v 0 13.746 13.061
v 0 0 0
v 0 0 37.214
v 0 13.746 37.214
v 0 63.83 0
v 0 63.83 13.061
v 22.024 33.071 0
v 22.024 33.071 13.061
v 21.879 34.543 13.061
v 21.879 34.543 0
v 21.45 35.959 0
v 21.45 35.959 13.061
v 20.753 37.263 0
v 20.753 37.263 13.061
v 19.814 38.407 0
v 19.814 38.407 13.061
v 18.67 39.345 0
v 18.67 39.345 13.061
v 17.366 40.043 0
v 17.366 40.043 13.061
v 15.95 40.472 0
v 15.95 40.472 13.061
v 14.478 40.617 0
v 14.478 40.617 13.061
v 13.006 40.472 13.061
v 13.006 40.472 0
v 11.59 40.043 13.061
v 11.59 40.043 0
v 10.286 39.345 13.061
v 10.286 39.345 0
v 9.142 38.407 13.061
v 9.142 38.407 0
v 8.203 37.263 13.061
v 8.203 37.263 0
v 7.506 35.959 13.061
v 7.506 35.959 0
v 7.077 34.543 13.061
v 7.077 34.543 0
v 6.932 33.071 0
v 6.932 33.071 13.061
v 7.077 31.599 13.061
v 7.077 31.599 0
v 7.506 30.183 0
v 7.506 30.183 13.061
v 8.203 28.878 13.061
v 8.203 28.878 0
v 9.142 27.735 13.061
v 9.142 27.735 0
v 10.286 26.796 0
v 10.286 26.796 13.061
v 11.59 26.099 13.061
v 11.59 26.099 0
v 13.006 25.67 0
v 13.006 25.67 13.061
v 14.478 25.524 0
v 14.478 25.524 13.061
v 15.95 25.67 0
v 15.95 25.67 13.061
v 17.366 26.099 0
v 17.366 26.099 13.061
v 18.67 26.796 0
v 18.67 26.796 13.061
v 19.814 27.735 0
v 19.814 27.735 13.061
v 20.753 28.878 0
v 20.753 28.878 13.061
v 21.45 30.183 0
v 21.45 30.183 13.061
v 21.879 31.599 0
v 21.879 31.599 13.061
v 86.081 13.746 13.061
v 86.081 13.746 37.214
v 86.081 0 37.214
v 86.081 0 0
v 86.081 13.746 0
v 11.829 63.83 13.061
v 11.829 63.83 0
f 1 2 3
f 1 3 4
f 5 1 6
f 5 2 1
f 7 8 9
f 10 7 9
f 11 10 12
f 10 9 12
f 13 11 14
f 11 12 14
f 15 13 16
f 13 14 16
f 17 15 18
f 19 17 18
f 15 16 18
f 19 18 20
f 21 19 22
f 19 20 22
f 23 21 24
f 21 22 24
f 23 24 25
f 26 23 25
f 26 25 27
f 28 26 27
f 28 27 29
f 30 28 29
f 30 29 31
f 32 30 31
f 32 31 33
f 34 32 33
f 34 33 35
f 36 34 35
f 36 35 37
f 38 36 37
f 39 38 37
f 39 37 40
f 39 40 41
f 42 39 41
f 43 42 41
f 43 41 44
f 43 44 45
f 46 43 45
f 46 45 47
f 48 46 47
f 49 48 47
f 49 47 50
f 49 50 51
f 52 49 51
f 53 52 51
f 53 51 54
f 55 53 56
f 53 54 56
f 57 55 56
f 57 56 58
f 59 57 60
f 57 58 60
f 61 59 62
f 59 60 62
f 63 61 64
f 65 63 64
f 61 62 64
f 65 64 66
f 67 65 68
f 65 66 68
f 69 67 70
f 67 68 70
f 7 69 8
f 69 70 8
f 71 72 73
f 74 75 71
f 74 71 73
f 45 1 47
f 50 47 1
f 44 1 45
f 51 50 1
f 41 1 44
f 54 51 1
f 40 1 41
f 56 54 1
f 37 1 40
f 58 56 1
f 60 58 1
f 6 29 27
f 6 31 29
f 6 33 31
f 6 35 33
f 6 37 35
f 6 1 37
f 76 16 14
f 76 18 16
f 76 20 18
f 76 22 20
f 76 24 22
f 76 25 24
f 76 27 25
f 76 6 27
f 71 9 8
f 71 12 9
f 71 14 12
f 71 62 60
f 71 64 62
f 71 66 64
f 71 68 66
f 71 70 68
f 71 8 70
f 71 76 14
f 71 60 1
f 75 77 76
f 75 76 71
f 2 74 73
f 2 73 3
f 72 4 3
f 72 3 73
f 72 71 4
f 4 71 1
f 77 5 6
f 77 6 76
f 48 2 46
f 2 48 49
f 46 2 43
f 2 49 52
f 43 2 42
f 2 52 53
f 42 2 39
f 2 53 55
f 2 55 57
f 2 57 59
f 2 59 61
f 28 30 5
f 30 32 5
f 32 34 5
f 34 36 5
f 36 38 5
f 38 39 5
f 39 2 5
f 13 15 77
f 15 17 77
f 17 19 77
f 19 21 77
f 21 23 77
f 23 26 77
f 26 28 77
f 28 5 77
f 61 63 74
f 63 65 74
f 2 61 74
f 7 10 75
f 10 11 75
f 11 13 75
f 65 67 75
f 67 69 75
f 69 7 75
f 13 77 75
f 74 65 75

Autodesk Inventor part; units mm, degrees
ref_plane "YZ Plane" through (0, 0, 0) normal (1, 0, 0) x (0, 1, 0)
ref_plane "XZ Plane" through (0, 0, 0) normal (0, 1, 0) x (-1, 0, 0)
ref_plane "XY Plane" through (0, 0, 0) normal (0, 0, 1) x (1, 0, 0)
sketch "Sketch1" plane through (0, 0, 0) normal (0, 0, 1) x (1, 0, 0)
  line L0 (0, 0) -> (0, 63.8302)
  line L1 (0, 63.8302) -> (11.8288, 63.8302)
  line L2 (11.8288, 63.8302) -> (86.0806, 13.7465)
  line L3 (86.0806, 13.7465) -> (86.0806, 0)
  line L4 (86.0806, 0) -> (0, 0)
  dimension "d0" = 11.8288
  dimension "d1" = 13.7465
  dimension "d2" = 63.8302
  dimension "d3" = 86.0806
extrude "Extrusion1" add sketch "Sketch1" along normal blind 13.0607
sketch "Sketch3" plane through (0, 0, 13.0607) normal (0, 0, 1) x (1, 0, 0)
  line L0 (86.0806, 0) -> (86.0806, 13.7465) projected
  line L1 (86.0806, 13.7465) -> (0, 13.7465)
  line L2 (0, 13.7465) -> (0, 0)
  line L3 (0, 0) -> (86.0806, 0)
  line L4 (86.0806, 0) -> (86.0806, 13.7465)
extrude "Extrusion2" add sketch "Sketch3" along normal blind 24.1529
sketch "Sketch4" plane through (0, 0, 13.0607) normal (0, 0, 1) x (1, 0, 0)
  circle A0 centre (14.478, 33.0708) radius 7.5463
  line L0 (11.8288, 63.8302) -> (0, 63.8302) projected
  line L1 (0, 63.8302) -> (0, 13.7465) projected
  point P0 (0, 0)
  dimension "d8" = 15.0927
  dimension "d9" = 30.7594
  dimension "d10" = 14.478
extrude "Extrusion3" cut sketch "Sketch4" against normal blind 24.1529
properties part number "WoodenBlock" material "Stainless Steel"
